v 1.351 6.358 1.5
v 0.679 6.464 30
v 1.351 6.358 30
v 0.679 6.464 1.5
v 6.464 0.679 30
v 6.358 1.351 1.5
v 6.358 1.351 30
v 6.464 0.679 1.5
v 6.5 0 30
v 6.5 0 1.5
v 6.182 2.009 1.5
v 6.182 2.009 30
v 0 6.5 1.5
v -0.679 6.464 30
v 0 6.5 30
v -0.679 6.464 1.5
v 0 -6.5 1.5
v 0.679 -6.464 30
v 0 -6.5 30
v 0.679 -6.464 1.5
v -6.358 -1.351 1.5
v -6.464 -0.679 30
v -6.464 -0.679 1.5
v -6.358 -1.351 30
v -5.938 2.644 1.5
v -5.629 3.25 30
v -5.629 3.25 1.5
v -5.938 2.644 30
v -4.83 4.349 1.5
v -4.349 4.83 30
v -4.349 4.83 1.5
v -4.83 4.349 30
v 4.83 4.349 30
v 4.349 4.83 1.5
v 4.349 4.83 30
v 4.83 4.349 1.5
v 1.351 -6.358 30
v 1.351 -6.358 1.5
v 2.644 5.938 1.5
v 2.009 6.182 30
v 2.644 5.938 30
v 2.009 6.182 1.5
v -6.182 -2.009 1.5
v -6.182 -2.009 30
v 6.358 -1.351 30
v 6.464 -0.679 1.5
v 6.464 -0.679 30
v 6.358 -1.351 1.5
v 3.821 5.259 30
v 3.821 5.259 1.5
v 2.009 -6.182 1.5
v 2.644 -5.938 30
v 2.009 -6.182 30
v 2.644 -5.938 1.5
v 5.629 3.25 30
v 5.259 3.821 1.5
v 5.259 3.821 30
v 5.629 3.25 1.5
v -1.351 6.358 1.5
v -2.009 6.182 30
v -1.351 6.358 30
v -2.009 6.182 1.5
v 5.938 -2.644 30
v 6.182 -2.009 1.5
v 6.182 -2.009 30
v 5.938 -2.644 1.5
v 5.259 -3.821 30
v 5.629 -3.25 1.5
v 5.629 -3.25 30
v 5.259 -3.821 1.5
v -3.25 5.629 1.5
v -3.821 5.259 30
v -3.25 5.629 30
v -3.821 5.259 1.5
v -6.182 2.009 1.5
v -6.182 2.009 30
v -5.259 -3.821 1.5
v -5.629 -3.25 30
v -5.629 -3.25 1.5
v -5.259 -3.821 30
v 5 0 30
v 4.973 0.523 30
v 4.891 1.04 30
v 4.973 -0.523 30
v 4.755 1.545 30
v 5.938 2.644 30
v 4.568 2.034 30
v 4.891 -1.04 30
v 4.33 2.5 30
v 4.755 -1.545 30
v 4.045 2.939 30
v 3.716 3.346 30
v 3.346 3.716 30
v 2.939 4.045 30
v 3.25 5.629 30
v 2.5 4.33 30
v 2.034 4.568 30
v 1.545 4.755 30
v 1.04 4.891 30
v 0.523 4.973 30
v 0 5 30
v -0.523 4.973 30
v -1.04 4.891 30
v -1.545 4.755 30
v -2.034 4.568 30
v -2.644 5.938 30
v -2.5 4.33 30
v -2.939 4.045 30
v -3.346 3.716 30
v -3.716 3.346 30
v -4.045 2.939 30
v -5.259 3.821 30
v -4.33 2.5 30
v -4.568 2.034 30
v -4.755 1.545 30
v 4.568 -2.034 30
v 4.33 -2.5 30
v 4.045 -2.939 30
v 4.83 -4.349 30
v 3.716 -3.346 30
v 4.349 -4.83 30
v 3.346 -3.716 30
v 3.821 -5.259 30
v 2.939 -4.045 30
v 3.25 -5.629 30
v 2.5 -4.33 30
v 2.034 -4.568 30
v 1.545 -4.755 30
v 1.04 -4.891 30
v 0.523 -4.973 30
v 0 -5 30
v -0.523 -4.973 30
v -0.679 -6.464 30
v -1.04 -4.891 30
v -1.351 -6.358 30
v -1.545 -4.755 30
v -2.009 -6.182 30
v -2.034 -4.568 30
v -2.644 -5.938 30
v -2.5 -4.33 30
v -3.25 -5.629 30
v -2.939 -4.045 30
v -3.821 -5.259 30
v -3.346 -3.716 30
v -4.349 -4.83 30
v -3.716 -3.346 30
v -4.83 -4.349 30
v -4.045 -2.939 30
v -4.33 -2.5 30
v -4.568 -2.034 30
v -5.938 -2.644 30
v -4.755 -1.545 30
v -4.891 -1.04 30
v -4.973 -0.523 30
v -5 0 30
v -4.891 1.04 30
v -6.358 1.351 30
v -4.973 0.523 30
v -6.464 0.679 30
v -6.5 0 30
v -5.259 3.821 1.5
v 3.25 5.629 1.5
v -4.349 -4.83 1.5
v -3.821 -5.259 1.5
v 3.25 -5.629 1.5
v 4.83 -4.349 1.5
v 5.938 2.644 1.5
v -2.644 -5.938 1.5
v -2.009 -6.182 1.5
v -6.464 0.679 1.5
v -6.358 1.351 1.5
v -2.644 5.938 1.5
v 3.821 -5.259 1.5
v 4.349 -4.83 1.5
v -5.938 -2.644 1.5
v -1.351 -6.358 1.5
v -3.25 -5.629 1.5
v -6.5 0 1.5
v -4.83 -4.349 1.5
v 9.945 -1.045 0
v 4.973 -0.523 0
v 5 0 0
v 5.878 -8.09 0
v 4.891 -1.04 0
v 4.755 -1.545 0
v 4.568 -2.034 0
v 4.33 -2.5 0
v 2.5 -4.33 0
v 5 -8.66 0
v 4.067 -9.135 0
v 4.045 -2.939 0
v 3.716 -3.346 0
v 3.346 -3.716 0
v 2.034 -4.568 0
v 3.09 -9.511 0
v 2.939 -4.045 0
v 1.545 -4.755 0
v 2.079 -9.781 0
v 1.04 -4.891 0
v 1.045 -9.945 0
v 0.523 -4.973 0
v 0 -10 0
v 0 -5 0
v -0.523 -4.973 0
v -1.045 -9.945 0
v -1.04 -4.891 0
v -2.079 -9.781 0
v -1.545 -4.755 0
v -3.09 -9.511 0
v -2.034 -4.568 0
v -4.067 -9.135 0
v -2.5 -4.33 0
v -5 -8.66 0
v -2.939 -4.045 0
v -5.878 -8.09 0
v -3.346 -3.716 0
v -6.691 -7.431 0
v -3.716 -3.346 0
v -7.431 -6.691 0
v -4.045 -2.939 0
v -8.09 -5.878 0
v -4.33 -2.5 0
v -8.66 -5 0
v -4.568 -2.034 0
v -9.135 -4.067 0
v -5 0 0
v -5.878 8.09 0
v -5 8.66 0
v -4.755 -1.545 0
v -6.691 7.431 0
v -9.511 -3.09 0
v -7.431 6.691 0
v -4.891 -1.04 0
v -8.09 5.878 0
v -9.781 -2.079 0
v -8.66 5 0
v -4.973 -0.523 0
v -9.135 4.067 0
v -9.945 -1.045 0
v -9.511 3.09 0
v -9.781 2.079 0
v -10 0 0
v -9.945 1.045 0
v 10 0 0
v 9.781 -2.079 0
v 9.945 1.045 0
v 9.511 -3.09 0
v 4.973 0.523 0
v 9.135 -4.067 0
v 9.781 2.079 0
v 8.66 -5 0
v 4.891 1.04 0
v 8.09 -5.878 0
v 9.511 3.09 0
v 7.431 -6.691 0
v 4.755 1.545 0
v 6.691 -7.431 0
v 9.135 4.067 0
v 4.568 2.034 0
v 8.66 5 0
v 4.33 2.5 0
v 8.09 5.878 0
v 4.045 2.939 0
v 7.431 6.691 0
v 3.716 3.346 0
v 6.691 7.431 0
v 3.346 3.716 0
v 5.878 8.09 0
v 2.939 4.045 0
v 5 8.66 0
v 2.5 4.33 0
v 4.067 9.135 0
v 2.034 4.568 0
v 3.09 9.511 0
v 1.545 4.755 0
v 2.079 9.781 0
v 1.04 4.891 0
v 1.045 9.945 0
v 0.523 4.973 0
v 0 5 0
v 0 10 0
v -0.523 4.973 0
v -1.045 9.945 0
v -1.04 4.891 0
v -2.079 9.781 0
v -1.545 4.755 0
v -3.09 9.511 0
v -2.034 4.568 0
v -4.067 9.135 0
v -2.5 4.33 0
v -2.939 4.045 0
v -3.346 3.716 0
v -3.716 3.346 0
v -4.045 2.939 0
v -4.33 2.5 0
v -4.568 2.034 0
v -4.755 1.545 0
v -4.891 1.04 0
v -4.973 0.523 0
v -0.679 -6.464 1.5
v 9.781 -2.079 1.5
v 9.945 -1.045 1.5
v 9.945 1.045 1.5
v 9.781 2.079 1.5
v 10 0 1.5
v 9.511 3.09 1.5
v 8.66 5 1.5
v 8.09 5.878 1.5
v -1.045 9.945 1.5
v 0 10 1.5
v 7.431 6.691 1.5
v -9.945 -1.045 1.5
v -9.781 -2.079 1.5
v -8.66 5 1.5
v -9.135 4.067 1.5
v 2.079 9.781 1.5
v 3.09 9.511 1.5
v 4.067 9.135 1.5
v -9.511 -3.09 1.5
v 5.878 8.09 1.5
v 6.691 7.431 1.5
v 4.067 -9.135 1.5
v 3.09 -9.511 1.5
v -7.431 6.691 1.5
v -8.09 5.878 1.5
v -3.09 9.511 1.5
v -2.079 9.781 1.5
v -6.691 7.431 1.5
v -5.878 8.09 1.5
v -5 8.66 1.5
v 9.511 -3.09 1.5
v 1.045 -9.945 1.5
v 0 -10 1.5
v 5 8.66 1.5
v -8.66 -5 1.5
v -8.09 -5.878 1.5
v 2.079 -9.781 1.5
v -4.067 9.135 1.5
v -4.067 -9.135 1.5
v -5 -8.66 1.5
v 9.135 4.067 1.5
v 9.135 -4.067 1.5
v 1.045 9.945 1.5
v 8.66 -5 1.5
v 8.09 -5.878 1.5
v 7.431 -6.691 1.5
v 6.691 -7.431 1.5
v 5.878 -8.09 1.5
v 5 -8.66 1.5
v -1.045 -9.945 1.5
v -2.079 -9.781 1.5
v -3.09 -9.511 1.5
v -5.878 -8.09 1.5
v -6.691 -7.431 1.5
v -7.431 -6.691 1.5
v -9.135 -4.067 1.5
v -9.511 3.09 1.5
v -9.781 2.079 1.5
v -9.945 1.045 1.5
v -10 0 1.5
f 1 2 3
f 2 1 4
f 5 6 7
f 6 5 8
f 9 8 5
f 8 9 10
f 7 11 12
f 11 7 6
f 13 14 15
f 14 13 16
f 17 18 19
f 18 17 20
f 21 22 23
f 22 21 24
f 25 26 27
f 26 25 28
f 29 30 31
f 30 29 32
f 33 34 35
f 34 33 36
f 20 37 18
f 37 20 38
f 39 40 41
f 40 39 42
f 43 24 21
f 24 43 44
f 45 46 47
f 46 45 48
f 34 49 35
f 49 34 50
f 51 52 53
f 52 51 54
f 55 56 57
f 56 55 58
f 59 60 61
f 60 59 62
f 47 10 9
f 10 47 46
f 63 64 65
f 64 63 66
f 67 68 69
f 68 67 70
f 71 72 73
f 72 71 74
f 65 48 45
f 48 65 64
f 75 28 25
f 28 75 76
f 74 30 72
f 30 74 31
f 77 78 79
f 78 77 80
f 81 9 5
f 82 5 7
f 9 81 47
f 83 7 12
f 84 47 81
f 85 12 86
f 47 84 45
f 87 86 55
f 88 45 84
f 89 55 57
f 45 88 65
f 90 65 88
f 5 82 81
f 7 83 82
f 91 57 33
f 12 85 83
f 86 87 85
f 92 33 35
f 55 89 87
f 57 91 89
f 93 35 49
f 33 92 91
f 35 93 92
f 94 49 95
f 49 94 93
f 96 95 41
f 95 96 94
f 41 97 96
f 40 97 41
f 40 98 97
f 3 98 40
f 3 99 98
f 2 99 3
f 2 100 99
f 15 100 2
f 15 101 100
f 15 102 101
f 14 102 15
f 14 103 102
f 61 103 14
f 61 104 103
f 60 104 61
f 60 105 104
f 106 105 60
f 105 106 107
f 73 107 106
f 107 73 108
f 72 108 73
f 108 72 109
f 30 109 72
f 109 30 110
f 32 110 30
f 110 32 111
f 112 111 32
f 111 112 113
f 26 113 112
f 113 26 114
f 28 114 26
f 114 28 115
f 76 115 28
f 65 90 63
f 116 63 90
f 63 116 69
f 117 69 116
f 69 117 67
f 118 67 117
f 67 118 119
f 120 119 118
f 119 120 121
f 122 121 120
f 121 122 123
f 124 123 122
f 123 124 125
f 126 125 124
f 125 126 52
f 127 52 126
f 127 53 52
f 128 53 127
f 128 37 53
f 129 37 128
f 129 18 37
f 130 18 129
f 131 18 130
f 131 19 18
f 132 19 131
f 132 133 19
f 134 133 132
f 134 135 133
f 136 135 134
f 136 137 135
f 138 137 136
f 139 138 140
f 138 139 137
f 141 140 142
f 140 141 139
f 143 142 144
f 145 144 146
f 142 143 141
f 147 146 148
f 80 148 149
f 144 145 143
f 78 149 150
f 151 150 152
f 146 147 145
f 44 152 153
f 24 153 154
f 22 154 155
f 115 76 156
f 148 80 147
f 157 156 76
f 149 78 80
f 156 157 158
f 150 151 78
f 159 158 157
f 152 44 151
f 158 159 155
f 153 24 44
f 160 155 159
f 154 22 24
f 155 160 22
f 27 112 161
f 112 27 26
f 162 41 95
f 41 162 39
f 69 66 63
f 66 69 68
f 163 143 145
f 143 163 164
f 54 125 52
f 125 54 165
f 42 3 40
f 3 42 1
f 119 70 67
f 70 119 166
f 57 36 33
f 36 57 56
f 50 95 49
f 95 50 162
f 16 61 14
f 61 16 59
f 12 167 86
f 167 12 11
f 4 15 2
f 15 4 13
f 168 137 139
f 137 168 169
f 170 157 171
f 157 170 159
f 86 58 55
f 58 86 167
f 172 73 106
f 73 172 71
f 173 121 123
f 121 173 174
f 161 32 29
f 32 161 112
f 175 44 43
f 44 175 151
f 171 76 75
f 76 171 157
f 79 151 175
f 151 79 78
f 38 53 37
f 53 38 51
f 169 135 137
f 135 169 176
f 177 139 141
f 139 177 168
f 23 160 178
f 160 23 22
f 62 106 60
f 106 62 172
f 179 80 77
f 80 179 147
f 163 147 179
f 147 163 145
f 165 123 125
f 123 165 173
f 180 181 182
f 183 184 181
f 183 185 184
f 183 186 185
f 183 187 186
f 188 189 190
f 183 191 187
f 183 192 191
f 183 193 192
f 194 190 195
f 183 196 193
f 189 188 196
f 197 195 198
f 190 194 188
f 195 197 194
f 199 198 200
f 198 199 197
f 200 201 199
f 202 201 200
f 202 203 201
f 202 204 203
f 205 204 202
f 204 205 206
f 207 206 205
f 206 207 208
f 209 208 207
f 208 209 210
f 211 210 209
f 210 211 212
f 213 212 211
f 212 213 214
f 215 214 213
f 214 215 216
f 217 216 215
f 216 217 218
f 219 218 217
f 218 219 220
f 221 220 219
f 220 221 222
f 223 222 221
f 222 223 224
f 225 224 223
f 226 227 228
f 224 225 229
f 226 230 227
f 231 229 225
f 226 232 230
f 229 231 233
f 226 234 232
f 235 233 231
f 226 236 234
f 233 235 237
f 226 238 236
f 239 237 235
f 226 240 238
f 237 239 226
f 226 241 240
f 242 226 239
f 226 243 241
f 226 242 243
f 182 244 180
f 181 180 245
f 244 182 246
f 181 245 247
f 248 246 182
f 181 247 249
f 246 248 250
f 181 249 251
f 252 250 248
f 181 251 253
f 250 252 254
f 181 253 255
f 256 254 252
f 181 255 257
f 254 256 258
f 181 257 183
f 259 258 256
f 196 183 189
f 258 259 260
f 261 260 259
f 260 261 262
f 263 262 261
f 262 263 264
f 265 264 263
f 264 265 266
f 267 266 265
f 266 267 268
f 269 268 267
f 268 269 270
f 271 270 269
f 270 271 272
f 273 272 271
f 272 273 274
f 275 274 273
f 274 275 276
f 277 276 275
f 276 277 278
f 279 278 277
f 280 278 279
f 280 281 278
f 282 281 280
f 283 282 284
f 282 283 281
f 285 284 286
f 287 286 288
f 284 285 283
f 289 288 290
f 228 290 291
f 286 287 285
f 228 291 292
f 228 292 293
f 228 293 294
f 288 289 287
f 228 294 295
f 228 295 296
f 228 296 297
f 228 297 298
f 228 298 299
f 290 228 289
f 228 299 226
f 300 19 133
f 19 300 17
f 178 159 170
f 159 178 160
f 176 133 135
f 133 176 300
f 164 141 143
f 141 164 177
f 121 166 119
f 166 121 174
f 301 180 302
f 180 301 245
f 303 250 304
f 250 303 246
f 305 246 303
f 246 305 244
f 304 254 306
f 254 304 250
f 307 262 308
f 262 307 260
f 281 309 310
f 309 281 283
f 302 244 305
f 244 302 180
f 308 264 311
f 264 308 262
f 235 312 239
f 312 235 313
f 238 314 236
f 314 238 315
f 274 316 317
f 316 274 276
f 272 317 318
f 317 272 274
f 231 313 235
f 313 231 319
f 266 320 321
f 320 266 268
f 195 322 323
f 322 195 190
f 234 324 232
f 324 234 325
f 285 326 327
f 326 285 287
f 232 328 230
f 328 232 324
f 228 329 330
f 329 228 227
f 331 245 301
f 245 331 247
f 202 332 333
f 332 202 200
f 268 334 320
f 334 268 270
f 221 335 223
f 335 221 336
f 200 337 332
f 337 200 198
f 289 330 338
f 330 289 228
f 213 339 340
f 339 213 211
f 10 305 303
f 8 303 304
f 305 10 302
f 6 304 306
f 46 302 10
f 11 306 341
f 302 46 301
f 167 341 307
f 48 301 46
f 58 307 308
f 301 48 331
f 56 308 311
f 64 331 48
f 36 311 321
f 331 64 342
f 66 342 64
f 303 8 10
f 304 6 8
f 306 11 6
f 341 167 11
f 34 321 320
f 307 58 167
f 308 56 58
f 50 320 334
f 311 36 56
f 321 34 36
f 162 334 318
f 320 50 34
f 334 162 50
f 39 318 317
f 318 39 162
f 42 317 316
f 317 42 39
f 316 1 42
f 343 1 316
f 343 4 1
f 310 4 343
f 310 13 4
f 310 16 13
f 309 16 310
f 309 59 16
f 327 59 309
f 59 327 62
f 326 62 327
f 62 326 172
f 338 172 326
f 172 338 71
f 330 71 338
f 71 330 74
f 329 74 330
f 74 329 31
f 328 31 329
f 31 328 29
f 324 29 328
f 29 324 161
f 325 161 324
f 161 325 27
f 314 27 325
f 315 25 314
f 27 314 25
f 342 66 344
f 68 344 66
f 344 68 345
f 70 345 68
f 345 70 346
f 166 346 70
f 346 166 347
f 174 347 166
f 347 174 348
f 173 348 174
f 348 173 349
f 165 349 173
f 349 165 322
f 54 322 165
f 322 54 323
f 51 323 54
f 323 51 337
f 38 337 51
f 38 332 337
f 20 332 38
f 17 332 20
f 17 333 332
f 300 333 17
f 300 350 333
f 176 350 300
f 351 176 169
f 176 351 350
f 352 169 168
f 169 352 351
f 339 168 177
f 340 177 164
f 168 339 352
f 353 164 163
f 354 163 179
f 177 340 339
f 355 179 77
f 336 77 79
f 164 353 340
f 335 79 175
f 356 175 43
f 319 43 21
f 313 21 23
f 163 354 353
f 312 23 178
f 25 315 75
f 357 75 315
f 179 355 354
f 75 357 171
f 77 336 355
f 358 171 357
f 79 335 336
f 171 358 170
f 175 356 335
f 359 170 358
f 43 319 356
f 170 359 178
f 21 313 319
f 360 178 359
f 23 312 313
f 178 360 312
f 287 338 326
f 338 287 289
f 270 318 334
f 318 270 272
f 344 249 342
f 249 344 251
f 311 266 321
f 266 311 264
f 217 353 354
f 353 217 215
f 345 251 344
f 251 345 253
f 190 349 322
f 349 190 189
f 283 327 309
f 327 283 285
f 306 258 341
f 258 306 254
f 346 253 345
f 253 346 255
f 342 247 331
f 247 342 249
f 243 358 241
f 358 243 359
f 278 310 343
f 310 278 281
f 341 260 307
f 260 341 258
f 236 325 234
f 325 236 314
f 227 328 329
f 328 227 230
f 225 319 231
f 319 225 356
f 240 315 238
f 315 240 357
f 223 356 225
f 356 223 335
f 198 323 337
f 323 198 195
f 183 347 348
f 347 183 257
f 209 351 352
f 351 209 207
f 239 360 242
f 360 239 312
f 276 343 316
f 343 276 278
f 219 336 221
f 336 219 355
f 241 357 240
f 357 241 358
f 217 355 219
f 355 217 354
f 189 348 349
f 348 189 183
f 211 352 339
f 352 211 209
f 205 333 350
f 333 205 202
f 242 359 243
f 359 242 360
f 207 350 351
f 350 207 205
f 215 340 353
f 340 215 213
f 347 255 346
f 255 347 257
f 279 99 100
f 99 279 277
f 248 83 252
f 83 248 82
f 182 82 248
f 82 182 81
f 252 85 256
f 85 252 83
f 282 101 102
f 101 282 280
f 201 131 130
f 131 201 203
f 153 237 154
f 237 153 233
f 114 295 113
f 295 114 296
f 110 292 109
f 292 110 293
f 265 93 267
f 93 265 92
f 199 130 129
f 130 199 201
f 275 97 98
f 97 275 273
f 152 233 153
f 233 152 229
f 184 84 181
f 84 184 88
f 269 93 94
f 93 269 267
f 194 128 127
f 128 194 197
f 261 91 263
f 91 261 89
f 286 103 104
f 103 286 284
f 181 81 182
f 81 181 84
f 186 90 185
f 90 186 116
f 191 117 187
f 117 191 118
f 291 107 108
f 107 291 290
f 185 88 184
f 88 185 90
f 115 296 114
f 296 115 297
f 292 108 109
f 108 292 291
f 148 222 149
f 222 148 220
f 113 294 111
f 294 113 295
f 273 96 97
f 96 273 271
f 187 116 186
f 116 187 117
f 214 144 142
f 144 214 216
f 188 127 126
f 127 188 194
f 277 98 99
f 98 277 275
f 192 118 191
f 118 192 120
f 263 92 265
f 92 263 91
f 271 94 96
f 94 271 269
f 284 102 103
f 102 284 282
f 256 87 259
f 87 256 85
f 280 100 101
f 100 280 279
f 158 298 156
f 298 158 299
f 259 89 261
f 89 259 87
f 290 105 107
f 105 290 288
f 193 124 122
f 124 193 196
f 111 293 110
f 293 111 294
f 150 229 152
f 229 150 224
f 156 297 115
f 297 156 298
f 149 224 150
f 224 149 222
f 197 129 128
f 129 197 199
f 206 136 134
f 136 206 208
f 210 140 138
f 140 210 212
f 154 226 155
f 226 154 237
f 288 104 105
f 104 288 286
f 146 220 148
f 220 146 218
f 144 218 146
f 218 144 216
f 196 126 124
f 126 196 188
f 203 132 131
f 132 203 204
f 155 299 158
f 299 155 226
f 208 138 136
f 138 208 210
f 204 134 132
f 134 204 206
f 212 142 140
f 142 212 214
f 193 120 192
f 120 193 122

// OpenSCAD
// Blind-rivet body.
$fn = 60;
eps = 0.02;
shank_d = 10;
head_d = 20;
length = 30;
difference() { union() { cylinder(d=shank_d+3,h=length); cylinder(d=max(head_d, shank_d+5),h=1.5); } translate([0,0,-eps]) cylinder(d=shank_d,h=length+2*eps); }
